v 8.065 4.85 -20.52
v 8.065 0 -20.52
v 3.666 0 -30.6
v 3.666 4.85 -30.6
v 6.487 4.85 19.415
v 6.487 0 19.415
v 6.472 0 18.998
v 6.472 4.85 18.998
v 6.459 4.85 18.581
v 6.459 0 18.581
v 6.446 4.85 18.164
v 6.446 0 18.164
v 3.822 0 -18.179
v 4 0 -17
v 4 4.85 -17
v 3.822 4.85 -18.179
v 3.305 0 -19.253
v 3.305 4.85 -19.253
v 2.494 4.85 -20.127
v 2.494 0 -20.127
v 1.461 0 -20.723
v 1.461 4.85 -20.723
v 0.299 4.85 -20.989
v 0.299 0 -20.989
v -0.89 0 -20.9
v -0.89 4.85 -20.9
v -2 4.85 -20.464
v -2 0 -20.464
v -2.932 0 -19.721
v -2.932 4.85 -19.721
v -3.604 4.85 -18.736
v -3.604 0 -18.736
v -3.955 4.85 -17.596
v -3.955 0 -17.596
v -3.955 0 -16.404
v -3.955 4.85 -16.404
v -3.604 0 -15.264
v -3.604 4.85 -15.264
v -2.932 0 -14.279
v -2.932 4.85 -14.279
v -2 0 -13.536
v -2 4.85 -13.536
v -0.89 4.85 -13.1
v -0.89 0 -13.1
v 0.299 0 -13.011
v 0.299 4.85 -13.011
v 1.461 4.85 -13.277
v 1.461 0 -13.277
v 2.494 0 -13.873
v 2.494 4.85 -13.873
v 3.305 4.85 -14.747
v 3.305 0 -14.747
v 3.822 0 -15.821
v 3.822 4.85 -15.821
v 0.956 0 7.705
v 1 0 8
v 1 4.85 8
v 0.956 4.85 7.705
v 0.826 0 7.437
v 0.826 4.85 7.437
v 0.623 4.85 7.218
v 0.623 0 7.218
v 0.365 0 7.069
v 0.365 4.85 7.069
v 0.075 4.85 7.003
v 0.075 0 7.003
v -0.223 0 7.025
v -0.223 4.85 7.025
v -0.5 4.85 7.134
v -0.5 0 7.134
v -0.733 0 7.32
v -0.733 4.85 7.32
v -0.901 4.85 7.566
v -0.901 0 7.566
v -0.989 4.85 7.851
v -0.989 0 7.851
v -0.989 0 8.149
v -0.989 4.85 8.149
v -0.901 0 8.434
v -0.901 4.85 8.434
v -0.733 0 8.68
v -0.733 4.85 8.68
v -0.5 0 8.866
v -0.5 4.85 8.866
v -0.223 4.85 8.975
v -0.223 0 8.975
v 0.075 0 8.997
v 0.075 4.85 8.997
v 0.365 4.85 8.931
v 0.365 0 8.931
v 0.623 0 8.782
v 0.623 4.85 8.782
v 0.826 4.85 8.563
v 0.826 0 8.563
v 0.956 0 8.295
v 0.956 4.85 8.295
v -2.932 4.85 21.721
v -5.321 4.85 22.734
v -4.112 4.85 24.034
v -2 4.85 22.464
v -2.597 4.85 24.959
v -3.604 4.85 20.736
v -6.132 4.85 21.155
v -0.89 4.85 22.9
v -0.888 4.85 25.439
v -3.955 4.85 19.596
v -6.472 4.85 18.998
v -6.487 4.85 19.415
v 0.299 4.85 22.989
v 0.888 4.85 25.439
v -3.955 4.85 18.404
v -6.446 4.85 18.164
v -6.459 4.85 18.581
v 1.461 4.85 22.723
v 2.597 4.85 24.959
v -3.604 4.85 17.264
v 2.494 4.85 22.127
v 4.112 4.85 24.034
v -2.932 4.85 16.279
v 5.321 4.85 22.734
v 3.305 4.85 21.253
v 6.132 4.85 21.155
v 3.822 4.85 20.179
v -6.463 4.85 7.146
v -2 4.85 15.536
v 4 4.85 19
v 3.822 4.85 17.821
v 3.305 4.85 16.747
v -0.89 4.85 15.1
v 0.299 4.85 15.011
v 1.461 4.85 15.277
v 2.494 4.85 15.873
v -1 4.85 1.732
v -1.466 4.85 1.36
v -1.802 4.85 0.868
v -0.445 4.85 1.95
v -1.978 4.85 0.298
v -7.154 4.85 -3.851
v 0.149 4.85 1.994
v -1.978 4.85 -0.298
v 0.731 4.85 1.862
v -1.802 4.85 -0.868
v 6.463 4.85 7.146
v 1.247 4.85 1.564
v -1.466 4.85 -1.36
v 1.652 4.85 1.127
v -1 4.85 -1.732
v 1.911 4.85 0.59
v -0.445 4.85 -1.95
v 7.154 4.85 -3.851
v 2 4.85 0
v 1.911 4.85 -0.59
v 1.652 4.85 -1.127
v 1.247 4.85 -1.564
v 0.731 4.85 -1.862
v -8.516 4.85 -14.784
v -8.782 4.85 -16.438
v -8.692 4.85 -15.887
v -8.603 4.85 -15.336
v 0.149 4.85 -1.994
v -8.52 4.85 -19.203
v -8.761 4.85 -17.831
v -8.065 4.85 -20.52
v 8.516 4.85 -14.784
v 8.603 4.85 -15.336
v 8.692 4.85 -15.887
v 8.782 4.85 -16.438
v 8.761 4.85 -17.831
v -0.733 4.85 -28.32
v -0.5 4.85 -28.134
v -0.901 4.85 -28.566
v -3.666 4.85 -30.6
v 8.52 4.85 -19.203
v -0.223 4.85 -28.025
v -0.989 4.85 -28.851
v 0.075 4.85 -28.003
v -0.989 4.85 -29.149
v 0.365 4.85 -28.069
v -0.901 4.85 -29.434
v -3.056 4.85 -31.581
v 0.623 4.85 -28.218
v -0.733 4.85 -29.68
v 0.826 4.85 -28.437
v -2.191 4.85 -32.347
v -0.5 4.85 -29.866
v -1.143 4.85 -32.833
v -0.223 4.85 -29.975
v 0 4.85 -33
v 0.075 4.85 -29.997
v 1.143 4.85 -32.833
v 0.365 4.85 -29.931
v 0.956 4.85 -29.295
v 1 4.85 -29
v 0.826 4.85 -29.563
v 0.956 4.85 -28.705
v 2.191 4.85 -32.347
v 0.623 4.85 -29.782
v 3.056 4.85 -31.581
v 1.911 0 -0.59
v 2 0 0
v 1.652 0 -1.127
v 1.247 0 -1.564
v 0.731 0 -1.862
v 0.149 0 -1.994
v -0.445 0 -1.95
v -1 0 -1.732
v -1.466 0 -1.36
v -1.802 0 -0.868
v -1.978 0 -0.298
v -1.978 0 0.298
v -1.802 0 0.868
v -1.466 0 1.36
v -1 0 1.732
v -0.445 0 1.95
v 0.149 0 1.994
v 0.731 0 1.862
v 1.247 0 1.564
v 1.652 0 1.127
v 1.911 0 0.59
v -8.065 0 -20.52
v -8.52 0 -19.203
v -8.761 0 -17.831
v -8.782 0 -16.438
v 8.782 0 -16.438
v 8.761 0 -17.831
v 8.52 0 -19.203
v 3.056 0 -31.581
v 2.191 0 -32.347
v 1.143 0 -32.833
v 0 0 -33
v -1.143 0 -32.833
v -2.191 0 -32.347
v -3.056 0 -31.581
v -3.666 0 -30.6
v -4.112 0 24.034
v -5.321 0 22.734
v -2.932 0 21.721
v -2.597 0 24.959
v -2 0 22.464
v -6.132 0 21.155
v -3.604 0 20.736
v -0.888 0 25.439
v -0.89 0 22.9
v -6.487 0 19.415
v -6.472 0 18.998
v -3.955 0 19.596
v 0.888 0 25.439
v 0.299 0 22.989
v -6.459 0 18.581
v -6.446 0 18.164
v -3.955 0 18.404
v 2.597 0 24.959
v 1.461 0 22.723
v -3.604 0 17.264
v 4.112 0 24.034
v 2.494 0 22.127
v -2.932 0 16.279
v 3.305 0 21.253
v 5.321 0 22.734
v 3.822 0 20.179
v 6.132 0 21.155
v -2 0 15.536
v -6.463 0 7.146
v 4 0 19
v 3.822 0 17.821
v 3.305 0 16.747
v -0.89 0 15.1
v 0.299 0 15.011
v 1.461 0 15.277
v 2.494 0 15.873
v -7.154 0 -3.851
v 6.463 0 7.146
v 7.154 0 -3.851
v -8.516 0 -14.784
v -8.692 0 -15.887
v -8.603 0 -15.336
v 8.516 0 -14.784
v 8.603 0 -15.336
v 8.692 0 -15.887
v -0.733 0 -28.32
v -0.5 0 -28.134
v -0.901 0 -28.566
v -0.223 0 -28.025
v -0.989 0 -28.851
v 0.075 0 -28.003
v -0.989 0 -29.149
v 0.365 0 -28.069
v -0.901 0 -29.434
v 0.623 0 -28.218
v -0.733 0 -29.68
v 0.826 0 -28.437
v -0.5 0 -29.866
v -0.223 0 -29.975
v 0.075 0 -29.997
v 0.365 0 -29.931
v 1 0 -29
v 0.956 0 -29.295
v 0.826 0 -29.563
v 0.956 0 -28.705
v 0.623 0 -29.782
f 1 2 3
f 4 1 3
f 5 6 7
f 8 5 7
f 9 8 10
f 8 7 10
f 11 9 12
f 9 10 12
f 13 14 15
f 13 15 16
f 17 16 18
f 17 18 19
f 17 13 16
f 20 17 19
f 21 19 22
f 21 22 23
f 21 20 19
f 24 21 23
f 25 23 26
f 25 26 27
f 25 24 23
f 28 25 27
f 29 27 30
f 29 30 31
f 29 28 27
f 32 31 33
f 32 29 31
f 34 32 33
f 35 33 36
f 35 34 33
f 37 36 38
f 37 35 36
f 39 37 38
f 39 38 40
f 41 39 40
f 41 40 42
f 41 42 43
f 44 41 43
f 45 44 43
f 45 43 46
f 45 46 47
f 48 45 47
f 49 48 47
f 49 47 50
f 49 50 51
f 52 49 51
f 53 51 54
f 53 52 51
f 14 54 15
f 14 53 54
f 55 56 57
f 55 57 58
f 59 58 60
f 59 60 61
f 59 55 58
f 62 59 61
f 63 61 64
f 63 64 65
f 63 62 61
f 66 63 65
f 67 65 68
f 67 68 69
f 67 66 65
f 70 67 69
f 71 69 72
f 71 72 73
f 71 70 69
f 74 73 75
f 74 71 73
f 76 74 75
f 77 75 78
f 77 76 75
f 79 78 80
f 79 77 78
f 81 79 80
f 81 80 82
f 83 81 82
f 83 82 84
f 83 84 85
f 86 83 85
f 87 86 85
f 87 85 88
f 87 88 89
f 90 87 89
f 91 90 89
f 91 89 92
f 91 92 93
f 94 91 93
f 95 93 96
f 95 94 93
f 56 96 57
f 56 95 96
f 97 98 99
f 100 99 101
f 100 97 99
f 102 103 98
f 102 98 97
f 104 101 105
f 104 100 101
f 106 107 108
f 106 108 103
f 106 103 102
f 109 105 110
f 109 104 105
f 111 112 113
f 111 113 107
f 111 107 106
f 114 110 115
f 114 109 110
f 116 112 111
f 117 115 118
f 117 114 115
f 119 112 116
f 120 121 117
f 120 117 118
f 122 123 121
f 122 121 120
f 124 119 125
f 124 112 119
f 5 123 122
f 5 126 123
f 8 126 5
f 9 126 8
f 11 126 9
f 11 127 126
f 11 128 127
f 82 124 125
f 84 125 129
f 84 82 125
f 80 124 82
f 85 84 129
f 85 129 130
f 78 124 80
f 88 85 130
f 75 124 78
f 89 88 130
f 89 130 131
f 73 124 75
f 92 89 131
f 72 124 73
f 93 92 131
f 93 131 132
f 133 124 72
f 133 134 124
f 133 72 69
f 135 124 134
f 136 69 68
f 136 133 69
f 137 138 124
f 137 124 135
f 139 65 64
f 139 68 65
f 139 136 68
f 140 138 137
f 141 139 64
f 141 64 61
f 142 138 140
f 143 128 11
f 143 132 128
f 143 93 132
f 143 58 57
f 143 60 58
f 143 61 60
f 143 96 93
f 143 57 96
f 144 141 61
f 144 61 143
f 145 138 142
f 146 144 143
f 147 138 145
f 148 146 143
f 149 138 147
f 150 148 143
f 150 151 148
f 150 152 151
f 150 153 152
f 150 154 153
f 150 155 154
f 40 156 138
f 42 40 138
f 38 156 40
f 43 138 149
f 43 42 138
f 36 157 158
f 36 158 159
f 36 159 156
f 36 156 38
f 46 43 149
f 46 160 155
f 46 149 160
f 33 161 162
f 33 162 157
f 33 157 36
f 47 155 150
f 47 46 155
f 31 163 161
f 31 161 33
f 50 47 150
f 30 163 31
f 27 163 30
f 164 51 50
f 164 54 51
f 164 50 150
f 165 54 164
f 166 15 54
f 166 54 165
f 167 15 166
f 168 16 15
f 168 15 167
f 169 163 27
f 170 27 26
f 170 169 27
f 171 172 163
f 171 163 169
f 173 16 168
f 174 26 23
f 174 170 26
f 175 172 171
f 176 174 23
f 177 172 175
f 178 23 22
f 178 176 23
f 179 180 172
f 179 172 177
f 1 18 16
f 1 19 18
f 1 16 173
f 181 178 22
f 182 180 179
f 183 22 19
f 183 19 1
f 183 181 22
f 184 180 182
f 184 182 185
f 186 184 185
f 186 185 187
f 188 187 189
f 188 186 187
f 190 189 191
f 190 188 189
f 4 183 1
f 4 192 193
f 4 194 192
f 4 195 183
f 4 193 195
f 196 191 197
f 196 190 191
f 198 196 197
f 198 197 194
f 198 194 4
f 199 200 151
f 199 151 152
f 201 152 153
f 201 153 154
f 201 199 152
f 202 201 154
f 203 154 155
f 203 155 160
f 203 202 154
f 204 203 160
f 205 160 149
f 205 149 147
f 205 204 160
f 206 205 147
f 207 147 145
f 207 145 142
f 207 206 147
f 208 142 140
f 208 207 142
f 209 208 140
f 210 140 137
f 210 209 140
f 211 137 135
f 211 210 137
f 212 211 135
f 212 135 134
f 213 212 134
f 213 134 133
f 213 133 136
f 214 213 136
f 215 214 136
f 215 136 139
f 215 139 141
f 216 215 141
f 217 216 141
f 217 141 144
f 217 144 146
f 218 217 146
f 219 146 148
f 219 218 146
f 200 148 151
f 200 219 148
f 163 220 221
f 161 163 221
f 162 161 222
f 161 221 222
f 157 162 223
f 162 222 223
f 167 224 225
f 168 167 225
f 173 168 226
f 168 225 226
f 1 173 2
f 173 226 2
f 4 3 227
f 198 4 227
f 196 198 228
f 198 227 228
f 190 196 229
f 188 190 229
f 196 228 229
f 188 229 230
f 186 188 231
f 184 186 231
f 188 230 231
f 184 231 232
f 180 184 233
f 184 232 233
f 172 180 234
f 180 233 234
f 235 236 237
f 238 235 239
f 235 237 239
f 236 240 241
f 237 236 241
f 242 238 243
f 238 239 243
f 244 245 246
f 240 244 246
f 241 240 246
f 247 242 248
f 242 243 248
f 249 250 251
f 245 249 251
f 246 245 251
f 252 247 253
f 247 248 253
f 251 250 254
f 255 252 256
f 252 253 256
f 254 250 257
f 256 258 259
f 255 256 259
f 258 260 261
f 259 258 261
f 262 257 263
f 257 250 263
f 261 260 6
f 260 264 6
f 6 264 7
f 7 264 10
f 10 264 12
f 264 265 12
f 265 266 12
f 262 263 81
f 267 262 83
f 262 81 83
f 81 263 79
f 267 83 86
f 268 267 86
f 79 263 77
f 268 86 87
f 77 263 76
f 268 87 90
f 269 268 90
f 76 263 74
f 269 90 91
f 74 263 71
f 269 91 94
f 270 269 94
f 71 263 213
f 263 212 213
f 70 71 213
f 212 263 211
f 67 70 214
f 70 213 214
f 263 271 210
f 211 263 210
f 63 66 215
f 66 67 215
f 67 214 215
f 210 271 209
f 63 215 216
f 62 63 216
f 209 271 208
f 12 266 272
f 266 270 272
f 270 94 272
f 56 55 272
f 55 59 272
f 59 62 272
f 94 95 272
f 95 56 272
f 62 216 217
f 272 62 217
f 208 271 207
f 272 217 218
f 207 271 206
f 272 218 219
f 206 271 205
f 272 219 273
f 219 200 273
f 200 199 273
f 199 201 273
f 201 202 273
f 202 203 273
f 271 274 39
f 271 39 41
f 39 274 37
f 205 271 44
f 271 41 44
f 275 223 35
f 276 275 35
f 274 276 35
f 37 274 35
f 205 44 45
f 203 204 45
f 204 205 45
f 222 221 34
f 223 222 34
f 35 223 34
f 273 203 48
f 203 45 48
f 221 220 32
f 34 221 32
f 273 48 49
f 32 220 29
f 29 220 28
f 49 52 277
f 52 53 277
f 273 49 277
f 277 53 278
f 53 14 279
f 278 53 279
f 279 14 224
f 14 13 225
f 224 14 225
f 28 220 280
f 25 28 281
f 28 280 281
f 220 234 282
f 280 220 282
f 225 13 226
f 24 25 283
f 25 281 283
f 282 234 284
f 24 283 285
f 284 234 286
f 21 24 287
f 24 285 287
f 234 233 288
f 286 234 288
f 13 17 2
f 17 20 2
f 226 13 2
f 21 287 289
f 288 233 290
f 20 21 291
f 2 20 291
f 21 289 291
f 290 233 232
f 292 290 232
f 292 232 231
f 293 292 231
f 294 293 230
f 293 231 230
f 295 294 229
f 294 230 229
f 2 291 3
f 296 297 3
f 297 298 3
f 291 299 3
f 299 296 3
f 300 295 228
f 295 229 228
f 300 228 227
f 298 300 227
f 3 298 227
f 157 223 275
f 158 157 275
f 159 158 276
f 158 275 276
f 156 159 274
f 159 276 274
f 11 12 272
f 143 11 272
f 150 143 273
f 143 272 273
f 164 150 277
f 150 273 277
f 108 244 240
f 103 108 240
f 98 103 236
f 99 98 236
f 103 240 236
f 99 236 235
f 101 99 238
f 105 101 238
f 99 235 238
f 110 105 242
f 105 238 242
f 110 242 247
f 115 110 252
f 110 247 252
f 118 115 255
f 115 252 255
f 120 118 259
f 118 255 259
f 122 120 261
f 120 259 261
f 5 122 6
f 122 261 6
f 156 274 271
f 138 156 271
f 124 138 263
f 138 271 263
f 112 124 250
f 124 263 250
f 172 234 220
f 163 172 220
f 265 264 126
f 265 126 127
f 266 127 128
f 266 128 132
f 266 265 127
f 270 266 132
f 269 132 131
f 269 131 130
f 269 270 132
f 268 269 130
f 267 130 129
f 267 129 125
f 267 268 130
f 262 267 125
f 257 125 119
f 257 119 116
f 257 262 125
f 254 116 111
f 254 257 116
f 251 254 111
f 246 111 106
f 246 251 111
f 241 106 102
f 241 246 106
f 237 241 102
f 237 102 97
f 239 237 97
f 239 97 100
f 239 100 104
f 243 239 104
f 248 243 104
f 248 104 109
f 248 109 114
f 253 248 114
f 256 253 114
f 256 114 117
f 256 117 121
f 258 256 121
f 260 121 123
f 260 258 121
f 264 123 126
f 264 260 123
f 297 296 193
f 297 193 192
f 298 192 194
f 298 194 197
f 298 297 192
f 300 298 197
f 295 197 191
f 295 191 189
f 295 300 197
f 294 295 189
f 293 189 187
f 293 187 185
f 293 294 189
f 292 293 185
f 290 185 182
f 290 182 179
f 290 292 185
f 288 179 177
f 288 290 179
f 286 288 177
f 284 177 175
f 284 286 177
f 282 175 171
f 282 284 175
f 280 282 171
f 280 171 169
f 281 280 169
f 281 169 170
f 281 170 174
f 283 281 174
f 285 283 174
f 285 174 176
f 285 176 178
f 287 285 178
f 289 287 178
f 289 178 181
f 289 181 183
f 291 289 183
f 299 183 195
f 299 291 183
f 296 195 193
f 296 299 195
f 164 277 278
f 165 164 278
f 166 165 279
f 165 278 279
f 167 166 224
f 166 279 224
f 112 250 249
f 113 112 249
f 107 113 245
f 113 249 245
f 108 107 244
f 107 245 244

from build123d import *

# Parameters (mm, degrees)
SKETCH1_R           = 4
SKETCH1_R_2         = 1
SKETCH1_R_3         = 2
BOSS_EXTRUDE1_DEPTH = 4.85


with BuildPart() as part:
    # Sketch1 → Boss-Extrude1 (new body)
    with BuildSketch(Plane(origin=(0, 0, 0), x_dir=(1, 0, 0), z_dir=(0, 1, 0))):
        with BuildLine():
            Line((-3.666060556, 30.6), (-8.065333223, 20.52))
            ThreePointArc((-8.065333223, 20.52), (-8.667437744, 18.521684251), (-8.782021759, 16.437777778))
            ThreePointArc((-8.782021759, 16.437777778), (-8.64730319, 15.61122755), (-8.516431626, 14.784059485))
            ThreePointArc((-8.516431626, 14.784059485), (-6.724262557, -1.642204863), (-6.445963017, -18.163602496))
            ThreePointArc((-6.445963017, -18.163602496), (-6.465253257, -18.789475583), (-6.486720617, -19.415277778))
            ThreePointArc((-6.486720617, -19.415277778), (0, -25.5), (6.486720617, -19.415277778))
            ThreePointArc((6.486720617, -19.415277778), (6.465253257, -18.789475583), (6.445963017, -18.163602496))
            ThreePointArc((6.445963017, -18.163602496), (6.724262557, -1.642204863), (8.516431626, 14.784059485))
            ThreePointArc((8.516431626, 14.784059485), (8.64730319, 15.61122755), (8.782021759, 16.437777778))
            ThreePointArc((8.782021759, 16.437777778), (8.667437744, 18.521684251), (8.065333223, 20.52))
            Line((8.065333223, 20.52), (3.666060556, 30.6))
            ThreePointArc((3.666060556, 30.6), (0, 33), (-3.666060556, 30.6))
        make_face()
        with Locations((0, -19)):
            Circle(SKETCH1_R, mode=Mode.SUBTRACT)
        with Locations((0, -8)):
            Circle(SKETCH1_R_2, mode=Mode.SUBTRACT)
        Circle(SKETCH1_R_3, mode=Mode.SUBTRACT)
        with Locations((0, 17)):
            Circle(SKETCH1_R, mode=Mode.SUBTRACT)
        with Locations((0, 29)):
            Circle(SKETCH1_R_2, mode=Mode.SUBTRACT)
    extrude(amount=BOSS_EXTRUDE1_DEPTH)


solid = part.part
